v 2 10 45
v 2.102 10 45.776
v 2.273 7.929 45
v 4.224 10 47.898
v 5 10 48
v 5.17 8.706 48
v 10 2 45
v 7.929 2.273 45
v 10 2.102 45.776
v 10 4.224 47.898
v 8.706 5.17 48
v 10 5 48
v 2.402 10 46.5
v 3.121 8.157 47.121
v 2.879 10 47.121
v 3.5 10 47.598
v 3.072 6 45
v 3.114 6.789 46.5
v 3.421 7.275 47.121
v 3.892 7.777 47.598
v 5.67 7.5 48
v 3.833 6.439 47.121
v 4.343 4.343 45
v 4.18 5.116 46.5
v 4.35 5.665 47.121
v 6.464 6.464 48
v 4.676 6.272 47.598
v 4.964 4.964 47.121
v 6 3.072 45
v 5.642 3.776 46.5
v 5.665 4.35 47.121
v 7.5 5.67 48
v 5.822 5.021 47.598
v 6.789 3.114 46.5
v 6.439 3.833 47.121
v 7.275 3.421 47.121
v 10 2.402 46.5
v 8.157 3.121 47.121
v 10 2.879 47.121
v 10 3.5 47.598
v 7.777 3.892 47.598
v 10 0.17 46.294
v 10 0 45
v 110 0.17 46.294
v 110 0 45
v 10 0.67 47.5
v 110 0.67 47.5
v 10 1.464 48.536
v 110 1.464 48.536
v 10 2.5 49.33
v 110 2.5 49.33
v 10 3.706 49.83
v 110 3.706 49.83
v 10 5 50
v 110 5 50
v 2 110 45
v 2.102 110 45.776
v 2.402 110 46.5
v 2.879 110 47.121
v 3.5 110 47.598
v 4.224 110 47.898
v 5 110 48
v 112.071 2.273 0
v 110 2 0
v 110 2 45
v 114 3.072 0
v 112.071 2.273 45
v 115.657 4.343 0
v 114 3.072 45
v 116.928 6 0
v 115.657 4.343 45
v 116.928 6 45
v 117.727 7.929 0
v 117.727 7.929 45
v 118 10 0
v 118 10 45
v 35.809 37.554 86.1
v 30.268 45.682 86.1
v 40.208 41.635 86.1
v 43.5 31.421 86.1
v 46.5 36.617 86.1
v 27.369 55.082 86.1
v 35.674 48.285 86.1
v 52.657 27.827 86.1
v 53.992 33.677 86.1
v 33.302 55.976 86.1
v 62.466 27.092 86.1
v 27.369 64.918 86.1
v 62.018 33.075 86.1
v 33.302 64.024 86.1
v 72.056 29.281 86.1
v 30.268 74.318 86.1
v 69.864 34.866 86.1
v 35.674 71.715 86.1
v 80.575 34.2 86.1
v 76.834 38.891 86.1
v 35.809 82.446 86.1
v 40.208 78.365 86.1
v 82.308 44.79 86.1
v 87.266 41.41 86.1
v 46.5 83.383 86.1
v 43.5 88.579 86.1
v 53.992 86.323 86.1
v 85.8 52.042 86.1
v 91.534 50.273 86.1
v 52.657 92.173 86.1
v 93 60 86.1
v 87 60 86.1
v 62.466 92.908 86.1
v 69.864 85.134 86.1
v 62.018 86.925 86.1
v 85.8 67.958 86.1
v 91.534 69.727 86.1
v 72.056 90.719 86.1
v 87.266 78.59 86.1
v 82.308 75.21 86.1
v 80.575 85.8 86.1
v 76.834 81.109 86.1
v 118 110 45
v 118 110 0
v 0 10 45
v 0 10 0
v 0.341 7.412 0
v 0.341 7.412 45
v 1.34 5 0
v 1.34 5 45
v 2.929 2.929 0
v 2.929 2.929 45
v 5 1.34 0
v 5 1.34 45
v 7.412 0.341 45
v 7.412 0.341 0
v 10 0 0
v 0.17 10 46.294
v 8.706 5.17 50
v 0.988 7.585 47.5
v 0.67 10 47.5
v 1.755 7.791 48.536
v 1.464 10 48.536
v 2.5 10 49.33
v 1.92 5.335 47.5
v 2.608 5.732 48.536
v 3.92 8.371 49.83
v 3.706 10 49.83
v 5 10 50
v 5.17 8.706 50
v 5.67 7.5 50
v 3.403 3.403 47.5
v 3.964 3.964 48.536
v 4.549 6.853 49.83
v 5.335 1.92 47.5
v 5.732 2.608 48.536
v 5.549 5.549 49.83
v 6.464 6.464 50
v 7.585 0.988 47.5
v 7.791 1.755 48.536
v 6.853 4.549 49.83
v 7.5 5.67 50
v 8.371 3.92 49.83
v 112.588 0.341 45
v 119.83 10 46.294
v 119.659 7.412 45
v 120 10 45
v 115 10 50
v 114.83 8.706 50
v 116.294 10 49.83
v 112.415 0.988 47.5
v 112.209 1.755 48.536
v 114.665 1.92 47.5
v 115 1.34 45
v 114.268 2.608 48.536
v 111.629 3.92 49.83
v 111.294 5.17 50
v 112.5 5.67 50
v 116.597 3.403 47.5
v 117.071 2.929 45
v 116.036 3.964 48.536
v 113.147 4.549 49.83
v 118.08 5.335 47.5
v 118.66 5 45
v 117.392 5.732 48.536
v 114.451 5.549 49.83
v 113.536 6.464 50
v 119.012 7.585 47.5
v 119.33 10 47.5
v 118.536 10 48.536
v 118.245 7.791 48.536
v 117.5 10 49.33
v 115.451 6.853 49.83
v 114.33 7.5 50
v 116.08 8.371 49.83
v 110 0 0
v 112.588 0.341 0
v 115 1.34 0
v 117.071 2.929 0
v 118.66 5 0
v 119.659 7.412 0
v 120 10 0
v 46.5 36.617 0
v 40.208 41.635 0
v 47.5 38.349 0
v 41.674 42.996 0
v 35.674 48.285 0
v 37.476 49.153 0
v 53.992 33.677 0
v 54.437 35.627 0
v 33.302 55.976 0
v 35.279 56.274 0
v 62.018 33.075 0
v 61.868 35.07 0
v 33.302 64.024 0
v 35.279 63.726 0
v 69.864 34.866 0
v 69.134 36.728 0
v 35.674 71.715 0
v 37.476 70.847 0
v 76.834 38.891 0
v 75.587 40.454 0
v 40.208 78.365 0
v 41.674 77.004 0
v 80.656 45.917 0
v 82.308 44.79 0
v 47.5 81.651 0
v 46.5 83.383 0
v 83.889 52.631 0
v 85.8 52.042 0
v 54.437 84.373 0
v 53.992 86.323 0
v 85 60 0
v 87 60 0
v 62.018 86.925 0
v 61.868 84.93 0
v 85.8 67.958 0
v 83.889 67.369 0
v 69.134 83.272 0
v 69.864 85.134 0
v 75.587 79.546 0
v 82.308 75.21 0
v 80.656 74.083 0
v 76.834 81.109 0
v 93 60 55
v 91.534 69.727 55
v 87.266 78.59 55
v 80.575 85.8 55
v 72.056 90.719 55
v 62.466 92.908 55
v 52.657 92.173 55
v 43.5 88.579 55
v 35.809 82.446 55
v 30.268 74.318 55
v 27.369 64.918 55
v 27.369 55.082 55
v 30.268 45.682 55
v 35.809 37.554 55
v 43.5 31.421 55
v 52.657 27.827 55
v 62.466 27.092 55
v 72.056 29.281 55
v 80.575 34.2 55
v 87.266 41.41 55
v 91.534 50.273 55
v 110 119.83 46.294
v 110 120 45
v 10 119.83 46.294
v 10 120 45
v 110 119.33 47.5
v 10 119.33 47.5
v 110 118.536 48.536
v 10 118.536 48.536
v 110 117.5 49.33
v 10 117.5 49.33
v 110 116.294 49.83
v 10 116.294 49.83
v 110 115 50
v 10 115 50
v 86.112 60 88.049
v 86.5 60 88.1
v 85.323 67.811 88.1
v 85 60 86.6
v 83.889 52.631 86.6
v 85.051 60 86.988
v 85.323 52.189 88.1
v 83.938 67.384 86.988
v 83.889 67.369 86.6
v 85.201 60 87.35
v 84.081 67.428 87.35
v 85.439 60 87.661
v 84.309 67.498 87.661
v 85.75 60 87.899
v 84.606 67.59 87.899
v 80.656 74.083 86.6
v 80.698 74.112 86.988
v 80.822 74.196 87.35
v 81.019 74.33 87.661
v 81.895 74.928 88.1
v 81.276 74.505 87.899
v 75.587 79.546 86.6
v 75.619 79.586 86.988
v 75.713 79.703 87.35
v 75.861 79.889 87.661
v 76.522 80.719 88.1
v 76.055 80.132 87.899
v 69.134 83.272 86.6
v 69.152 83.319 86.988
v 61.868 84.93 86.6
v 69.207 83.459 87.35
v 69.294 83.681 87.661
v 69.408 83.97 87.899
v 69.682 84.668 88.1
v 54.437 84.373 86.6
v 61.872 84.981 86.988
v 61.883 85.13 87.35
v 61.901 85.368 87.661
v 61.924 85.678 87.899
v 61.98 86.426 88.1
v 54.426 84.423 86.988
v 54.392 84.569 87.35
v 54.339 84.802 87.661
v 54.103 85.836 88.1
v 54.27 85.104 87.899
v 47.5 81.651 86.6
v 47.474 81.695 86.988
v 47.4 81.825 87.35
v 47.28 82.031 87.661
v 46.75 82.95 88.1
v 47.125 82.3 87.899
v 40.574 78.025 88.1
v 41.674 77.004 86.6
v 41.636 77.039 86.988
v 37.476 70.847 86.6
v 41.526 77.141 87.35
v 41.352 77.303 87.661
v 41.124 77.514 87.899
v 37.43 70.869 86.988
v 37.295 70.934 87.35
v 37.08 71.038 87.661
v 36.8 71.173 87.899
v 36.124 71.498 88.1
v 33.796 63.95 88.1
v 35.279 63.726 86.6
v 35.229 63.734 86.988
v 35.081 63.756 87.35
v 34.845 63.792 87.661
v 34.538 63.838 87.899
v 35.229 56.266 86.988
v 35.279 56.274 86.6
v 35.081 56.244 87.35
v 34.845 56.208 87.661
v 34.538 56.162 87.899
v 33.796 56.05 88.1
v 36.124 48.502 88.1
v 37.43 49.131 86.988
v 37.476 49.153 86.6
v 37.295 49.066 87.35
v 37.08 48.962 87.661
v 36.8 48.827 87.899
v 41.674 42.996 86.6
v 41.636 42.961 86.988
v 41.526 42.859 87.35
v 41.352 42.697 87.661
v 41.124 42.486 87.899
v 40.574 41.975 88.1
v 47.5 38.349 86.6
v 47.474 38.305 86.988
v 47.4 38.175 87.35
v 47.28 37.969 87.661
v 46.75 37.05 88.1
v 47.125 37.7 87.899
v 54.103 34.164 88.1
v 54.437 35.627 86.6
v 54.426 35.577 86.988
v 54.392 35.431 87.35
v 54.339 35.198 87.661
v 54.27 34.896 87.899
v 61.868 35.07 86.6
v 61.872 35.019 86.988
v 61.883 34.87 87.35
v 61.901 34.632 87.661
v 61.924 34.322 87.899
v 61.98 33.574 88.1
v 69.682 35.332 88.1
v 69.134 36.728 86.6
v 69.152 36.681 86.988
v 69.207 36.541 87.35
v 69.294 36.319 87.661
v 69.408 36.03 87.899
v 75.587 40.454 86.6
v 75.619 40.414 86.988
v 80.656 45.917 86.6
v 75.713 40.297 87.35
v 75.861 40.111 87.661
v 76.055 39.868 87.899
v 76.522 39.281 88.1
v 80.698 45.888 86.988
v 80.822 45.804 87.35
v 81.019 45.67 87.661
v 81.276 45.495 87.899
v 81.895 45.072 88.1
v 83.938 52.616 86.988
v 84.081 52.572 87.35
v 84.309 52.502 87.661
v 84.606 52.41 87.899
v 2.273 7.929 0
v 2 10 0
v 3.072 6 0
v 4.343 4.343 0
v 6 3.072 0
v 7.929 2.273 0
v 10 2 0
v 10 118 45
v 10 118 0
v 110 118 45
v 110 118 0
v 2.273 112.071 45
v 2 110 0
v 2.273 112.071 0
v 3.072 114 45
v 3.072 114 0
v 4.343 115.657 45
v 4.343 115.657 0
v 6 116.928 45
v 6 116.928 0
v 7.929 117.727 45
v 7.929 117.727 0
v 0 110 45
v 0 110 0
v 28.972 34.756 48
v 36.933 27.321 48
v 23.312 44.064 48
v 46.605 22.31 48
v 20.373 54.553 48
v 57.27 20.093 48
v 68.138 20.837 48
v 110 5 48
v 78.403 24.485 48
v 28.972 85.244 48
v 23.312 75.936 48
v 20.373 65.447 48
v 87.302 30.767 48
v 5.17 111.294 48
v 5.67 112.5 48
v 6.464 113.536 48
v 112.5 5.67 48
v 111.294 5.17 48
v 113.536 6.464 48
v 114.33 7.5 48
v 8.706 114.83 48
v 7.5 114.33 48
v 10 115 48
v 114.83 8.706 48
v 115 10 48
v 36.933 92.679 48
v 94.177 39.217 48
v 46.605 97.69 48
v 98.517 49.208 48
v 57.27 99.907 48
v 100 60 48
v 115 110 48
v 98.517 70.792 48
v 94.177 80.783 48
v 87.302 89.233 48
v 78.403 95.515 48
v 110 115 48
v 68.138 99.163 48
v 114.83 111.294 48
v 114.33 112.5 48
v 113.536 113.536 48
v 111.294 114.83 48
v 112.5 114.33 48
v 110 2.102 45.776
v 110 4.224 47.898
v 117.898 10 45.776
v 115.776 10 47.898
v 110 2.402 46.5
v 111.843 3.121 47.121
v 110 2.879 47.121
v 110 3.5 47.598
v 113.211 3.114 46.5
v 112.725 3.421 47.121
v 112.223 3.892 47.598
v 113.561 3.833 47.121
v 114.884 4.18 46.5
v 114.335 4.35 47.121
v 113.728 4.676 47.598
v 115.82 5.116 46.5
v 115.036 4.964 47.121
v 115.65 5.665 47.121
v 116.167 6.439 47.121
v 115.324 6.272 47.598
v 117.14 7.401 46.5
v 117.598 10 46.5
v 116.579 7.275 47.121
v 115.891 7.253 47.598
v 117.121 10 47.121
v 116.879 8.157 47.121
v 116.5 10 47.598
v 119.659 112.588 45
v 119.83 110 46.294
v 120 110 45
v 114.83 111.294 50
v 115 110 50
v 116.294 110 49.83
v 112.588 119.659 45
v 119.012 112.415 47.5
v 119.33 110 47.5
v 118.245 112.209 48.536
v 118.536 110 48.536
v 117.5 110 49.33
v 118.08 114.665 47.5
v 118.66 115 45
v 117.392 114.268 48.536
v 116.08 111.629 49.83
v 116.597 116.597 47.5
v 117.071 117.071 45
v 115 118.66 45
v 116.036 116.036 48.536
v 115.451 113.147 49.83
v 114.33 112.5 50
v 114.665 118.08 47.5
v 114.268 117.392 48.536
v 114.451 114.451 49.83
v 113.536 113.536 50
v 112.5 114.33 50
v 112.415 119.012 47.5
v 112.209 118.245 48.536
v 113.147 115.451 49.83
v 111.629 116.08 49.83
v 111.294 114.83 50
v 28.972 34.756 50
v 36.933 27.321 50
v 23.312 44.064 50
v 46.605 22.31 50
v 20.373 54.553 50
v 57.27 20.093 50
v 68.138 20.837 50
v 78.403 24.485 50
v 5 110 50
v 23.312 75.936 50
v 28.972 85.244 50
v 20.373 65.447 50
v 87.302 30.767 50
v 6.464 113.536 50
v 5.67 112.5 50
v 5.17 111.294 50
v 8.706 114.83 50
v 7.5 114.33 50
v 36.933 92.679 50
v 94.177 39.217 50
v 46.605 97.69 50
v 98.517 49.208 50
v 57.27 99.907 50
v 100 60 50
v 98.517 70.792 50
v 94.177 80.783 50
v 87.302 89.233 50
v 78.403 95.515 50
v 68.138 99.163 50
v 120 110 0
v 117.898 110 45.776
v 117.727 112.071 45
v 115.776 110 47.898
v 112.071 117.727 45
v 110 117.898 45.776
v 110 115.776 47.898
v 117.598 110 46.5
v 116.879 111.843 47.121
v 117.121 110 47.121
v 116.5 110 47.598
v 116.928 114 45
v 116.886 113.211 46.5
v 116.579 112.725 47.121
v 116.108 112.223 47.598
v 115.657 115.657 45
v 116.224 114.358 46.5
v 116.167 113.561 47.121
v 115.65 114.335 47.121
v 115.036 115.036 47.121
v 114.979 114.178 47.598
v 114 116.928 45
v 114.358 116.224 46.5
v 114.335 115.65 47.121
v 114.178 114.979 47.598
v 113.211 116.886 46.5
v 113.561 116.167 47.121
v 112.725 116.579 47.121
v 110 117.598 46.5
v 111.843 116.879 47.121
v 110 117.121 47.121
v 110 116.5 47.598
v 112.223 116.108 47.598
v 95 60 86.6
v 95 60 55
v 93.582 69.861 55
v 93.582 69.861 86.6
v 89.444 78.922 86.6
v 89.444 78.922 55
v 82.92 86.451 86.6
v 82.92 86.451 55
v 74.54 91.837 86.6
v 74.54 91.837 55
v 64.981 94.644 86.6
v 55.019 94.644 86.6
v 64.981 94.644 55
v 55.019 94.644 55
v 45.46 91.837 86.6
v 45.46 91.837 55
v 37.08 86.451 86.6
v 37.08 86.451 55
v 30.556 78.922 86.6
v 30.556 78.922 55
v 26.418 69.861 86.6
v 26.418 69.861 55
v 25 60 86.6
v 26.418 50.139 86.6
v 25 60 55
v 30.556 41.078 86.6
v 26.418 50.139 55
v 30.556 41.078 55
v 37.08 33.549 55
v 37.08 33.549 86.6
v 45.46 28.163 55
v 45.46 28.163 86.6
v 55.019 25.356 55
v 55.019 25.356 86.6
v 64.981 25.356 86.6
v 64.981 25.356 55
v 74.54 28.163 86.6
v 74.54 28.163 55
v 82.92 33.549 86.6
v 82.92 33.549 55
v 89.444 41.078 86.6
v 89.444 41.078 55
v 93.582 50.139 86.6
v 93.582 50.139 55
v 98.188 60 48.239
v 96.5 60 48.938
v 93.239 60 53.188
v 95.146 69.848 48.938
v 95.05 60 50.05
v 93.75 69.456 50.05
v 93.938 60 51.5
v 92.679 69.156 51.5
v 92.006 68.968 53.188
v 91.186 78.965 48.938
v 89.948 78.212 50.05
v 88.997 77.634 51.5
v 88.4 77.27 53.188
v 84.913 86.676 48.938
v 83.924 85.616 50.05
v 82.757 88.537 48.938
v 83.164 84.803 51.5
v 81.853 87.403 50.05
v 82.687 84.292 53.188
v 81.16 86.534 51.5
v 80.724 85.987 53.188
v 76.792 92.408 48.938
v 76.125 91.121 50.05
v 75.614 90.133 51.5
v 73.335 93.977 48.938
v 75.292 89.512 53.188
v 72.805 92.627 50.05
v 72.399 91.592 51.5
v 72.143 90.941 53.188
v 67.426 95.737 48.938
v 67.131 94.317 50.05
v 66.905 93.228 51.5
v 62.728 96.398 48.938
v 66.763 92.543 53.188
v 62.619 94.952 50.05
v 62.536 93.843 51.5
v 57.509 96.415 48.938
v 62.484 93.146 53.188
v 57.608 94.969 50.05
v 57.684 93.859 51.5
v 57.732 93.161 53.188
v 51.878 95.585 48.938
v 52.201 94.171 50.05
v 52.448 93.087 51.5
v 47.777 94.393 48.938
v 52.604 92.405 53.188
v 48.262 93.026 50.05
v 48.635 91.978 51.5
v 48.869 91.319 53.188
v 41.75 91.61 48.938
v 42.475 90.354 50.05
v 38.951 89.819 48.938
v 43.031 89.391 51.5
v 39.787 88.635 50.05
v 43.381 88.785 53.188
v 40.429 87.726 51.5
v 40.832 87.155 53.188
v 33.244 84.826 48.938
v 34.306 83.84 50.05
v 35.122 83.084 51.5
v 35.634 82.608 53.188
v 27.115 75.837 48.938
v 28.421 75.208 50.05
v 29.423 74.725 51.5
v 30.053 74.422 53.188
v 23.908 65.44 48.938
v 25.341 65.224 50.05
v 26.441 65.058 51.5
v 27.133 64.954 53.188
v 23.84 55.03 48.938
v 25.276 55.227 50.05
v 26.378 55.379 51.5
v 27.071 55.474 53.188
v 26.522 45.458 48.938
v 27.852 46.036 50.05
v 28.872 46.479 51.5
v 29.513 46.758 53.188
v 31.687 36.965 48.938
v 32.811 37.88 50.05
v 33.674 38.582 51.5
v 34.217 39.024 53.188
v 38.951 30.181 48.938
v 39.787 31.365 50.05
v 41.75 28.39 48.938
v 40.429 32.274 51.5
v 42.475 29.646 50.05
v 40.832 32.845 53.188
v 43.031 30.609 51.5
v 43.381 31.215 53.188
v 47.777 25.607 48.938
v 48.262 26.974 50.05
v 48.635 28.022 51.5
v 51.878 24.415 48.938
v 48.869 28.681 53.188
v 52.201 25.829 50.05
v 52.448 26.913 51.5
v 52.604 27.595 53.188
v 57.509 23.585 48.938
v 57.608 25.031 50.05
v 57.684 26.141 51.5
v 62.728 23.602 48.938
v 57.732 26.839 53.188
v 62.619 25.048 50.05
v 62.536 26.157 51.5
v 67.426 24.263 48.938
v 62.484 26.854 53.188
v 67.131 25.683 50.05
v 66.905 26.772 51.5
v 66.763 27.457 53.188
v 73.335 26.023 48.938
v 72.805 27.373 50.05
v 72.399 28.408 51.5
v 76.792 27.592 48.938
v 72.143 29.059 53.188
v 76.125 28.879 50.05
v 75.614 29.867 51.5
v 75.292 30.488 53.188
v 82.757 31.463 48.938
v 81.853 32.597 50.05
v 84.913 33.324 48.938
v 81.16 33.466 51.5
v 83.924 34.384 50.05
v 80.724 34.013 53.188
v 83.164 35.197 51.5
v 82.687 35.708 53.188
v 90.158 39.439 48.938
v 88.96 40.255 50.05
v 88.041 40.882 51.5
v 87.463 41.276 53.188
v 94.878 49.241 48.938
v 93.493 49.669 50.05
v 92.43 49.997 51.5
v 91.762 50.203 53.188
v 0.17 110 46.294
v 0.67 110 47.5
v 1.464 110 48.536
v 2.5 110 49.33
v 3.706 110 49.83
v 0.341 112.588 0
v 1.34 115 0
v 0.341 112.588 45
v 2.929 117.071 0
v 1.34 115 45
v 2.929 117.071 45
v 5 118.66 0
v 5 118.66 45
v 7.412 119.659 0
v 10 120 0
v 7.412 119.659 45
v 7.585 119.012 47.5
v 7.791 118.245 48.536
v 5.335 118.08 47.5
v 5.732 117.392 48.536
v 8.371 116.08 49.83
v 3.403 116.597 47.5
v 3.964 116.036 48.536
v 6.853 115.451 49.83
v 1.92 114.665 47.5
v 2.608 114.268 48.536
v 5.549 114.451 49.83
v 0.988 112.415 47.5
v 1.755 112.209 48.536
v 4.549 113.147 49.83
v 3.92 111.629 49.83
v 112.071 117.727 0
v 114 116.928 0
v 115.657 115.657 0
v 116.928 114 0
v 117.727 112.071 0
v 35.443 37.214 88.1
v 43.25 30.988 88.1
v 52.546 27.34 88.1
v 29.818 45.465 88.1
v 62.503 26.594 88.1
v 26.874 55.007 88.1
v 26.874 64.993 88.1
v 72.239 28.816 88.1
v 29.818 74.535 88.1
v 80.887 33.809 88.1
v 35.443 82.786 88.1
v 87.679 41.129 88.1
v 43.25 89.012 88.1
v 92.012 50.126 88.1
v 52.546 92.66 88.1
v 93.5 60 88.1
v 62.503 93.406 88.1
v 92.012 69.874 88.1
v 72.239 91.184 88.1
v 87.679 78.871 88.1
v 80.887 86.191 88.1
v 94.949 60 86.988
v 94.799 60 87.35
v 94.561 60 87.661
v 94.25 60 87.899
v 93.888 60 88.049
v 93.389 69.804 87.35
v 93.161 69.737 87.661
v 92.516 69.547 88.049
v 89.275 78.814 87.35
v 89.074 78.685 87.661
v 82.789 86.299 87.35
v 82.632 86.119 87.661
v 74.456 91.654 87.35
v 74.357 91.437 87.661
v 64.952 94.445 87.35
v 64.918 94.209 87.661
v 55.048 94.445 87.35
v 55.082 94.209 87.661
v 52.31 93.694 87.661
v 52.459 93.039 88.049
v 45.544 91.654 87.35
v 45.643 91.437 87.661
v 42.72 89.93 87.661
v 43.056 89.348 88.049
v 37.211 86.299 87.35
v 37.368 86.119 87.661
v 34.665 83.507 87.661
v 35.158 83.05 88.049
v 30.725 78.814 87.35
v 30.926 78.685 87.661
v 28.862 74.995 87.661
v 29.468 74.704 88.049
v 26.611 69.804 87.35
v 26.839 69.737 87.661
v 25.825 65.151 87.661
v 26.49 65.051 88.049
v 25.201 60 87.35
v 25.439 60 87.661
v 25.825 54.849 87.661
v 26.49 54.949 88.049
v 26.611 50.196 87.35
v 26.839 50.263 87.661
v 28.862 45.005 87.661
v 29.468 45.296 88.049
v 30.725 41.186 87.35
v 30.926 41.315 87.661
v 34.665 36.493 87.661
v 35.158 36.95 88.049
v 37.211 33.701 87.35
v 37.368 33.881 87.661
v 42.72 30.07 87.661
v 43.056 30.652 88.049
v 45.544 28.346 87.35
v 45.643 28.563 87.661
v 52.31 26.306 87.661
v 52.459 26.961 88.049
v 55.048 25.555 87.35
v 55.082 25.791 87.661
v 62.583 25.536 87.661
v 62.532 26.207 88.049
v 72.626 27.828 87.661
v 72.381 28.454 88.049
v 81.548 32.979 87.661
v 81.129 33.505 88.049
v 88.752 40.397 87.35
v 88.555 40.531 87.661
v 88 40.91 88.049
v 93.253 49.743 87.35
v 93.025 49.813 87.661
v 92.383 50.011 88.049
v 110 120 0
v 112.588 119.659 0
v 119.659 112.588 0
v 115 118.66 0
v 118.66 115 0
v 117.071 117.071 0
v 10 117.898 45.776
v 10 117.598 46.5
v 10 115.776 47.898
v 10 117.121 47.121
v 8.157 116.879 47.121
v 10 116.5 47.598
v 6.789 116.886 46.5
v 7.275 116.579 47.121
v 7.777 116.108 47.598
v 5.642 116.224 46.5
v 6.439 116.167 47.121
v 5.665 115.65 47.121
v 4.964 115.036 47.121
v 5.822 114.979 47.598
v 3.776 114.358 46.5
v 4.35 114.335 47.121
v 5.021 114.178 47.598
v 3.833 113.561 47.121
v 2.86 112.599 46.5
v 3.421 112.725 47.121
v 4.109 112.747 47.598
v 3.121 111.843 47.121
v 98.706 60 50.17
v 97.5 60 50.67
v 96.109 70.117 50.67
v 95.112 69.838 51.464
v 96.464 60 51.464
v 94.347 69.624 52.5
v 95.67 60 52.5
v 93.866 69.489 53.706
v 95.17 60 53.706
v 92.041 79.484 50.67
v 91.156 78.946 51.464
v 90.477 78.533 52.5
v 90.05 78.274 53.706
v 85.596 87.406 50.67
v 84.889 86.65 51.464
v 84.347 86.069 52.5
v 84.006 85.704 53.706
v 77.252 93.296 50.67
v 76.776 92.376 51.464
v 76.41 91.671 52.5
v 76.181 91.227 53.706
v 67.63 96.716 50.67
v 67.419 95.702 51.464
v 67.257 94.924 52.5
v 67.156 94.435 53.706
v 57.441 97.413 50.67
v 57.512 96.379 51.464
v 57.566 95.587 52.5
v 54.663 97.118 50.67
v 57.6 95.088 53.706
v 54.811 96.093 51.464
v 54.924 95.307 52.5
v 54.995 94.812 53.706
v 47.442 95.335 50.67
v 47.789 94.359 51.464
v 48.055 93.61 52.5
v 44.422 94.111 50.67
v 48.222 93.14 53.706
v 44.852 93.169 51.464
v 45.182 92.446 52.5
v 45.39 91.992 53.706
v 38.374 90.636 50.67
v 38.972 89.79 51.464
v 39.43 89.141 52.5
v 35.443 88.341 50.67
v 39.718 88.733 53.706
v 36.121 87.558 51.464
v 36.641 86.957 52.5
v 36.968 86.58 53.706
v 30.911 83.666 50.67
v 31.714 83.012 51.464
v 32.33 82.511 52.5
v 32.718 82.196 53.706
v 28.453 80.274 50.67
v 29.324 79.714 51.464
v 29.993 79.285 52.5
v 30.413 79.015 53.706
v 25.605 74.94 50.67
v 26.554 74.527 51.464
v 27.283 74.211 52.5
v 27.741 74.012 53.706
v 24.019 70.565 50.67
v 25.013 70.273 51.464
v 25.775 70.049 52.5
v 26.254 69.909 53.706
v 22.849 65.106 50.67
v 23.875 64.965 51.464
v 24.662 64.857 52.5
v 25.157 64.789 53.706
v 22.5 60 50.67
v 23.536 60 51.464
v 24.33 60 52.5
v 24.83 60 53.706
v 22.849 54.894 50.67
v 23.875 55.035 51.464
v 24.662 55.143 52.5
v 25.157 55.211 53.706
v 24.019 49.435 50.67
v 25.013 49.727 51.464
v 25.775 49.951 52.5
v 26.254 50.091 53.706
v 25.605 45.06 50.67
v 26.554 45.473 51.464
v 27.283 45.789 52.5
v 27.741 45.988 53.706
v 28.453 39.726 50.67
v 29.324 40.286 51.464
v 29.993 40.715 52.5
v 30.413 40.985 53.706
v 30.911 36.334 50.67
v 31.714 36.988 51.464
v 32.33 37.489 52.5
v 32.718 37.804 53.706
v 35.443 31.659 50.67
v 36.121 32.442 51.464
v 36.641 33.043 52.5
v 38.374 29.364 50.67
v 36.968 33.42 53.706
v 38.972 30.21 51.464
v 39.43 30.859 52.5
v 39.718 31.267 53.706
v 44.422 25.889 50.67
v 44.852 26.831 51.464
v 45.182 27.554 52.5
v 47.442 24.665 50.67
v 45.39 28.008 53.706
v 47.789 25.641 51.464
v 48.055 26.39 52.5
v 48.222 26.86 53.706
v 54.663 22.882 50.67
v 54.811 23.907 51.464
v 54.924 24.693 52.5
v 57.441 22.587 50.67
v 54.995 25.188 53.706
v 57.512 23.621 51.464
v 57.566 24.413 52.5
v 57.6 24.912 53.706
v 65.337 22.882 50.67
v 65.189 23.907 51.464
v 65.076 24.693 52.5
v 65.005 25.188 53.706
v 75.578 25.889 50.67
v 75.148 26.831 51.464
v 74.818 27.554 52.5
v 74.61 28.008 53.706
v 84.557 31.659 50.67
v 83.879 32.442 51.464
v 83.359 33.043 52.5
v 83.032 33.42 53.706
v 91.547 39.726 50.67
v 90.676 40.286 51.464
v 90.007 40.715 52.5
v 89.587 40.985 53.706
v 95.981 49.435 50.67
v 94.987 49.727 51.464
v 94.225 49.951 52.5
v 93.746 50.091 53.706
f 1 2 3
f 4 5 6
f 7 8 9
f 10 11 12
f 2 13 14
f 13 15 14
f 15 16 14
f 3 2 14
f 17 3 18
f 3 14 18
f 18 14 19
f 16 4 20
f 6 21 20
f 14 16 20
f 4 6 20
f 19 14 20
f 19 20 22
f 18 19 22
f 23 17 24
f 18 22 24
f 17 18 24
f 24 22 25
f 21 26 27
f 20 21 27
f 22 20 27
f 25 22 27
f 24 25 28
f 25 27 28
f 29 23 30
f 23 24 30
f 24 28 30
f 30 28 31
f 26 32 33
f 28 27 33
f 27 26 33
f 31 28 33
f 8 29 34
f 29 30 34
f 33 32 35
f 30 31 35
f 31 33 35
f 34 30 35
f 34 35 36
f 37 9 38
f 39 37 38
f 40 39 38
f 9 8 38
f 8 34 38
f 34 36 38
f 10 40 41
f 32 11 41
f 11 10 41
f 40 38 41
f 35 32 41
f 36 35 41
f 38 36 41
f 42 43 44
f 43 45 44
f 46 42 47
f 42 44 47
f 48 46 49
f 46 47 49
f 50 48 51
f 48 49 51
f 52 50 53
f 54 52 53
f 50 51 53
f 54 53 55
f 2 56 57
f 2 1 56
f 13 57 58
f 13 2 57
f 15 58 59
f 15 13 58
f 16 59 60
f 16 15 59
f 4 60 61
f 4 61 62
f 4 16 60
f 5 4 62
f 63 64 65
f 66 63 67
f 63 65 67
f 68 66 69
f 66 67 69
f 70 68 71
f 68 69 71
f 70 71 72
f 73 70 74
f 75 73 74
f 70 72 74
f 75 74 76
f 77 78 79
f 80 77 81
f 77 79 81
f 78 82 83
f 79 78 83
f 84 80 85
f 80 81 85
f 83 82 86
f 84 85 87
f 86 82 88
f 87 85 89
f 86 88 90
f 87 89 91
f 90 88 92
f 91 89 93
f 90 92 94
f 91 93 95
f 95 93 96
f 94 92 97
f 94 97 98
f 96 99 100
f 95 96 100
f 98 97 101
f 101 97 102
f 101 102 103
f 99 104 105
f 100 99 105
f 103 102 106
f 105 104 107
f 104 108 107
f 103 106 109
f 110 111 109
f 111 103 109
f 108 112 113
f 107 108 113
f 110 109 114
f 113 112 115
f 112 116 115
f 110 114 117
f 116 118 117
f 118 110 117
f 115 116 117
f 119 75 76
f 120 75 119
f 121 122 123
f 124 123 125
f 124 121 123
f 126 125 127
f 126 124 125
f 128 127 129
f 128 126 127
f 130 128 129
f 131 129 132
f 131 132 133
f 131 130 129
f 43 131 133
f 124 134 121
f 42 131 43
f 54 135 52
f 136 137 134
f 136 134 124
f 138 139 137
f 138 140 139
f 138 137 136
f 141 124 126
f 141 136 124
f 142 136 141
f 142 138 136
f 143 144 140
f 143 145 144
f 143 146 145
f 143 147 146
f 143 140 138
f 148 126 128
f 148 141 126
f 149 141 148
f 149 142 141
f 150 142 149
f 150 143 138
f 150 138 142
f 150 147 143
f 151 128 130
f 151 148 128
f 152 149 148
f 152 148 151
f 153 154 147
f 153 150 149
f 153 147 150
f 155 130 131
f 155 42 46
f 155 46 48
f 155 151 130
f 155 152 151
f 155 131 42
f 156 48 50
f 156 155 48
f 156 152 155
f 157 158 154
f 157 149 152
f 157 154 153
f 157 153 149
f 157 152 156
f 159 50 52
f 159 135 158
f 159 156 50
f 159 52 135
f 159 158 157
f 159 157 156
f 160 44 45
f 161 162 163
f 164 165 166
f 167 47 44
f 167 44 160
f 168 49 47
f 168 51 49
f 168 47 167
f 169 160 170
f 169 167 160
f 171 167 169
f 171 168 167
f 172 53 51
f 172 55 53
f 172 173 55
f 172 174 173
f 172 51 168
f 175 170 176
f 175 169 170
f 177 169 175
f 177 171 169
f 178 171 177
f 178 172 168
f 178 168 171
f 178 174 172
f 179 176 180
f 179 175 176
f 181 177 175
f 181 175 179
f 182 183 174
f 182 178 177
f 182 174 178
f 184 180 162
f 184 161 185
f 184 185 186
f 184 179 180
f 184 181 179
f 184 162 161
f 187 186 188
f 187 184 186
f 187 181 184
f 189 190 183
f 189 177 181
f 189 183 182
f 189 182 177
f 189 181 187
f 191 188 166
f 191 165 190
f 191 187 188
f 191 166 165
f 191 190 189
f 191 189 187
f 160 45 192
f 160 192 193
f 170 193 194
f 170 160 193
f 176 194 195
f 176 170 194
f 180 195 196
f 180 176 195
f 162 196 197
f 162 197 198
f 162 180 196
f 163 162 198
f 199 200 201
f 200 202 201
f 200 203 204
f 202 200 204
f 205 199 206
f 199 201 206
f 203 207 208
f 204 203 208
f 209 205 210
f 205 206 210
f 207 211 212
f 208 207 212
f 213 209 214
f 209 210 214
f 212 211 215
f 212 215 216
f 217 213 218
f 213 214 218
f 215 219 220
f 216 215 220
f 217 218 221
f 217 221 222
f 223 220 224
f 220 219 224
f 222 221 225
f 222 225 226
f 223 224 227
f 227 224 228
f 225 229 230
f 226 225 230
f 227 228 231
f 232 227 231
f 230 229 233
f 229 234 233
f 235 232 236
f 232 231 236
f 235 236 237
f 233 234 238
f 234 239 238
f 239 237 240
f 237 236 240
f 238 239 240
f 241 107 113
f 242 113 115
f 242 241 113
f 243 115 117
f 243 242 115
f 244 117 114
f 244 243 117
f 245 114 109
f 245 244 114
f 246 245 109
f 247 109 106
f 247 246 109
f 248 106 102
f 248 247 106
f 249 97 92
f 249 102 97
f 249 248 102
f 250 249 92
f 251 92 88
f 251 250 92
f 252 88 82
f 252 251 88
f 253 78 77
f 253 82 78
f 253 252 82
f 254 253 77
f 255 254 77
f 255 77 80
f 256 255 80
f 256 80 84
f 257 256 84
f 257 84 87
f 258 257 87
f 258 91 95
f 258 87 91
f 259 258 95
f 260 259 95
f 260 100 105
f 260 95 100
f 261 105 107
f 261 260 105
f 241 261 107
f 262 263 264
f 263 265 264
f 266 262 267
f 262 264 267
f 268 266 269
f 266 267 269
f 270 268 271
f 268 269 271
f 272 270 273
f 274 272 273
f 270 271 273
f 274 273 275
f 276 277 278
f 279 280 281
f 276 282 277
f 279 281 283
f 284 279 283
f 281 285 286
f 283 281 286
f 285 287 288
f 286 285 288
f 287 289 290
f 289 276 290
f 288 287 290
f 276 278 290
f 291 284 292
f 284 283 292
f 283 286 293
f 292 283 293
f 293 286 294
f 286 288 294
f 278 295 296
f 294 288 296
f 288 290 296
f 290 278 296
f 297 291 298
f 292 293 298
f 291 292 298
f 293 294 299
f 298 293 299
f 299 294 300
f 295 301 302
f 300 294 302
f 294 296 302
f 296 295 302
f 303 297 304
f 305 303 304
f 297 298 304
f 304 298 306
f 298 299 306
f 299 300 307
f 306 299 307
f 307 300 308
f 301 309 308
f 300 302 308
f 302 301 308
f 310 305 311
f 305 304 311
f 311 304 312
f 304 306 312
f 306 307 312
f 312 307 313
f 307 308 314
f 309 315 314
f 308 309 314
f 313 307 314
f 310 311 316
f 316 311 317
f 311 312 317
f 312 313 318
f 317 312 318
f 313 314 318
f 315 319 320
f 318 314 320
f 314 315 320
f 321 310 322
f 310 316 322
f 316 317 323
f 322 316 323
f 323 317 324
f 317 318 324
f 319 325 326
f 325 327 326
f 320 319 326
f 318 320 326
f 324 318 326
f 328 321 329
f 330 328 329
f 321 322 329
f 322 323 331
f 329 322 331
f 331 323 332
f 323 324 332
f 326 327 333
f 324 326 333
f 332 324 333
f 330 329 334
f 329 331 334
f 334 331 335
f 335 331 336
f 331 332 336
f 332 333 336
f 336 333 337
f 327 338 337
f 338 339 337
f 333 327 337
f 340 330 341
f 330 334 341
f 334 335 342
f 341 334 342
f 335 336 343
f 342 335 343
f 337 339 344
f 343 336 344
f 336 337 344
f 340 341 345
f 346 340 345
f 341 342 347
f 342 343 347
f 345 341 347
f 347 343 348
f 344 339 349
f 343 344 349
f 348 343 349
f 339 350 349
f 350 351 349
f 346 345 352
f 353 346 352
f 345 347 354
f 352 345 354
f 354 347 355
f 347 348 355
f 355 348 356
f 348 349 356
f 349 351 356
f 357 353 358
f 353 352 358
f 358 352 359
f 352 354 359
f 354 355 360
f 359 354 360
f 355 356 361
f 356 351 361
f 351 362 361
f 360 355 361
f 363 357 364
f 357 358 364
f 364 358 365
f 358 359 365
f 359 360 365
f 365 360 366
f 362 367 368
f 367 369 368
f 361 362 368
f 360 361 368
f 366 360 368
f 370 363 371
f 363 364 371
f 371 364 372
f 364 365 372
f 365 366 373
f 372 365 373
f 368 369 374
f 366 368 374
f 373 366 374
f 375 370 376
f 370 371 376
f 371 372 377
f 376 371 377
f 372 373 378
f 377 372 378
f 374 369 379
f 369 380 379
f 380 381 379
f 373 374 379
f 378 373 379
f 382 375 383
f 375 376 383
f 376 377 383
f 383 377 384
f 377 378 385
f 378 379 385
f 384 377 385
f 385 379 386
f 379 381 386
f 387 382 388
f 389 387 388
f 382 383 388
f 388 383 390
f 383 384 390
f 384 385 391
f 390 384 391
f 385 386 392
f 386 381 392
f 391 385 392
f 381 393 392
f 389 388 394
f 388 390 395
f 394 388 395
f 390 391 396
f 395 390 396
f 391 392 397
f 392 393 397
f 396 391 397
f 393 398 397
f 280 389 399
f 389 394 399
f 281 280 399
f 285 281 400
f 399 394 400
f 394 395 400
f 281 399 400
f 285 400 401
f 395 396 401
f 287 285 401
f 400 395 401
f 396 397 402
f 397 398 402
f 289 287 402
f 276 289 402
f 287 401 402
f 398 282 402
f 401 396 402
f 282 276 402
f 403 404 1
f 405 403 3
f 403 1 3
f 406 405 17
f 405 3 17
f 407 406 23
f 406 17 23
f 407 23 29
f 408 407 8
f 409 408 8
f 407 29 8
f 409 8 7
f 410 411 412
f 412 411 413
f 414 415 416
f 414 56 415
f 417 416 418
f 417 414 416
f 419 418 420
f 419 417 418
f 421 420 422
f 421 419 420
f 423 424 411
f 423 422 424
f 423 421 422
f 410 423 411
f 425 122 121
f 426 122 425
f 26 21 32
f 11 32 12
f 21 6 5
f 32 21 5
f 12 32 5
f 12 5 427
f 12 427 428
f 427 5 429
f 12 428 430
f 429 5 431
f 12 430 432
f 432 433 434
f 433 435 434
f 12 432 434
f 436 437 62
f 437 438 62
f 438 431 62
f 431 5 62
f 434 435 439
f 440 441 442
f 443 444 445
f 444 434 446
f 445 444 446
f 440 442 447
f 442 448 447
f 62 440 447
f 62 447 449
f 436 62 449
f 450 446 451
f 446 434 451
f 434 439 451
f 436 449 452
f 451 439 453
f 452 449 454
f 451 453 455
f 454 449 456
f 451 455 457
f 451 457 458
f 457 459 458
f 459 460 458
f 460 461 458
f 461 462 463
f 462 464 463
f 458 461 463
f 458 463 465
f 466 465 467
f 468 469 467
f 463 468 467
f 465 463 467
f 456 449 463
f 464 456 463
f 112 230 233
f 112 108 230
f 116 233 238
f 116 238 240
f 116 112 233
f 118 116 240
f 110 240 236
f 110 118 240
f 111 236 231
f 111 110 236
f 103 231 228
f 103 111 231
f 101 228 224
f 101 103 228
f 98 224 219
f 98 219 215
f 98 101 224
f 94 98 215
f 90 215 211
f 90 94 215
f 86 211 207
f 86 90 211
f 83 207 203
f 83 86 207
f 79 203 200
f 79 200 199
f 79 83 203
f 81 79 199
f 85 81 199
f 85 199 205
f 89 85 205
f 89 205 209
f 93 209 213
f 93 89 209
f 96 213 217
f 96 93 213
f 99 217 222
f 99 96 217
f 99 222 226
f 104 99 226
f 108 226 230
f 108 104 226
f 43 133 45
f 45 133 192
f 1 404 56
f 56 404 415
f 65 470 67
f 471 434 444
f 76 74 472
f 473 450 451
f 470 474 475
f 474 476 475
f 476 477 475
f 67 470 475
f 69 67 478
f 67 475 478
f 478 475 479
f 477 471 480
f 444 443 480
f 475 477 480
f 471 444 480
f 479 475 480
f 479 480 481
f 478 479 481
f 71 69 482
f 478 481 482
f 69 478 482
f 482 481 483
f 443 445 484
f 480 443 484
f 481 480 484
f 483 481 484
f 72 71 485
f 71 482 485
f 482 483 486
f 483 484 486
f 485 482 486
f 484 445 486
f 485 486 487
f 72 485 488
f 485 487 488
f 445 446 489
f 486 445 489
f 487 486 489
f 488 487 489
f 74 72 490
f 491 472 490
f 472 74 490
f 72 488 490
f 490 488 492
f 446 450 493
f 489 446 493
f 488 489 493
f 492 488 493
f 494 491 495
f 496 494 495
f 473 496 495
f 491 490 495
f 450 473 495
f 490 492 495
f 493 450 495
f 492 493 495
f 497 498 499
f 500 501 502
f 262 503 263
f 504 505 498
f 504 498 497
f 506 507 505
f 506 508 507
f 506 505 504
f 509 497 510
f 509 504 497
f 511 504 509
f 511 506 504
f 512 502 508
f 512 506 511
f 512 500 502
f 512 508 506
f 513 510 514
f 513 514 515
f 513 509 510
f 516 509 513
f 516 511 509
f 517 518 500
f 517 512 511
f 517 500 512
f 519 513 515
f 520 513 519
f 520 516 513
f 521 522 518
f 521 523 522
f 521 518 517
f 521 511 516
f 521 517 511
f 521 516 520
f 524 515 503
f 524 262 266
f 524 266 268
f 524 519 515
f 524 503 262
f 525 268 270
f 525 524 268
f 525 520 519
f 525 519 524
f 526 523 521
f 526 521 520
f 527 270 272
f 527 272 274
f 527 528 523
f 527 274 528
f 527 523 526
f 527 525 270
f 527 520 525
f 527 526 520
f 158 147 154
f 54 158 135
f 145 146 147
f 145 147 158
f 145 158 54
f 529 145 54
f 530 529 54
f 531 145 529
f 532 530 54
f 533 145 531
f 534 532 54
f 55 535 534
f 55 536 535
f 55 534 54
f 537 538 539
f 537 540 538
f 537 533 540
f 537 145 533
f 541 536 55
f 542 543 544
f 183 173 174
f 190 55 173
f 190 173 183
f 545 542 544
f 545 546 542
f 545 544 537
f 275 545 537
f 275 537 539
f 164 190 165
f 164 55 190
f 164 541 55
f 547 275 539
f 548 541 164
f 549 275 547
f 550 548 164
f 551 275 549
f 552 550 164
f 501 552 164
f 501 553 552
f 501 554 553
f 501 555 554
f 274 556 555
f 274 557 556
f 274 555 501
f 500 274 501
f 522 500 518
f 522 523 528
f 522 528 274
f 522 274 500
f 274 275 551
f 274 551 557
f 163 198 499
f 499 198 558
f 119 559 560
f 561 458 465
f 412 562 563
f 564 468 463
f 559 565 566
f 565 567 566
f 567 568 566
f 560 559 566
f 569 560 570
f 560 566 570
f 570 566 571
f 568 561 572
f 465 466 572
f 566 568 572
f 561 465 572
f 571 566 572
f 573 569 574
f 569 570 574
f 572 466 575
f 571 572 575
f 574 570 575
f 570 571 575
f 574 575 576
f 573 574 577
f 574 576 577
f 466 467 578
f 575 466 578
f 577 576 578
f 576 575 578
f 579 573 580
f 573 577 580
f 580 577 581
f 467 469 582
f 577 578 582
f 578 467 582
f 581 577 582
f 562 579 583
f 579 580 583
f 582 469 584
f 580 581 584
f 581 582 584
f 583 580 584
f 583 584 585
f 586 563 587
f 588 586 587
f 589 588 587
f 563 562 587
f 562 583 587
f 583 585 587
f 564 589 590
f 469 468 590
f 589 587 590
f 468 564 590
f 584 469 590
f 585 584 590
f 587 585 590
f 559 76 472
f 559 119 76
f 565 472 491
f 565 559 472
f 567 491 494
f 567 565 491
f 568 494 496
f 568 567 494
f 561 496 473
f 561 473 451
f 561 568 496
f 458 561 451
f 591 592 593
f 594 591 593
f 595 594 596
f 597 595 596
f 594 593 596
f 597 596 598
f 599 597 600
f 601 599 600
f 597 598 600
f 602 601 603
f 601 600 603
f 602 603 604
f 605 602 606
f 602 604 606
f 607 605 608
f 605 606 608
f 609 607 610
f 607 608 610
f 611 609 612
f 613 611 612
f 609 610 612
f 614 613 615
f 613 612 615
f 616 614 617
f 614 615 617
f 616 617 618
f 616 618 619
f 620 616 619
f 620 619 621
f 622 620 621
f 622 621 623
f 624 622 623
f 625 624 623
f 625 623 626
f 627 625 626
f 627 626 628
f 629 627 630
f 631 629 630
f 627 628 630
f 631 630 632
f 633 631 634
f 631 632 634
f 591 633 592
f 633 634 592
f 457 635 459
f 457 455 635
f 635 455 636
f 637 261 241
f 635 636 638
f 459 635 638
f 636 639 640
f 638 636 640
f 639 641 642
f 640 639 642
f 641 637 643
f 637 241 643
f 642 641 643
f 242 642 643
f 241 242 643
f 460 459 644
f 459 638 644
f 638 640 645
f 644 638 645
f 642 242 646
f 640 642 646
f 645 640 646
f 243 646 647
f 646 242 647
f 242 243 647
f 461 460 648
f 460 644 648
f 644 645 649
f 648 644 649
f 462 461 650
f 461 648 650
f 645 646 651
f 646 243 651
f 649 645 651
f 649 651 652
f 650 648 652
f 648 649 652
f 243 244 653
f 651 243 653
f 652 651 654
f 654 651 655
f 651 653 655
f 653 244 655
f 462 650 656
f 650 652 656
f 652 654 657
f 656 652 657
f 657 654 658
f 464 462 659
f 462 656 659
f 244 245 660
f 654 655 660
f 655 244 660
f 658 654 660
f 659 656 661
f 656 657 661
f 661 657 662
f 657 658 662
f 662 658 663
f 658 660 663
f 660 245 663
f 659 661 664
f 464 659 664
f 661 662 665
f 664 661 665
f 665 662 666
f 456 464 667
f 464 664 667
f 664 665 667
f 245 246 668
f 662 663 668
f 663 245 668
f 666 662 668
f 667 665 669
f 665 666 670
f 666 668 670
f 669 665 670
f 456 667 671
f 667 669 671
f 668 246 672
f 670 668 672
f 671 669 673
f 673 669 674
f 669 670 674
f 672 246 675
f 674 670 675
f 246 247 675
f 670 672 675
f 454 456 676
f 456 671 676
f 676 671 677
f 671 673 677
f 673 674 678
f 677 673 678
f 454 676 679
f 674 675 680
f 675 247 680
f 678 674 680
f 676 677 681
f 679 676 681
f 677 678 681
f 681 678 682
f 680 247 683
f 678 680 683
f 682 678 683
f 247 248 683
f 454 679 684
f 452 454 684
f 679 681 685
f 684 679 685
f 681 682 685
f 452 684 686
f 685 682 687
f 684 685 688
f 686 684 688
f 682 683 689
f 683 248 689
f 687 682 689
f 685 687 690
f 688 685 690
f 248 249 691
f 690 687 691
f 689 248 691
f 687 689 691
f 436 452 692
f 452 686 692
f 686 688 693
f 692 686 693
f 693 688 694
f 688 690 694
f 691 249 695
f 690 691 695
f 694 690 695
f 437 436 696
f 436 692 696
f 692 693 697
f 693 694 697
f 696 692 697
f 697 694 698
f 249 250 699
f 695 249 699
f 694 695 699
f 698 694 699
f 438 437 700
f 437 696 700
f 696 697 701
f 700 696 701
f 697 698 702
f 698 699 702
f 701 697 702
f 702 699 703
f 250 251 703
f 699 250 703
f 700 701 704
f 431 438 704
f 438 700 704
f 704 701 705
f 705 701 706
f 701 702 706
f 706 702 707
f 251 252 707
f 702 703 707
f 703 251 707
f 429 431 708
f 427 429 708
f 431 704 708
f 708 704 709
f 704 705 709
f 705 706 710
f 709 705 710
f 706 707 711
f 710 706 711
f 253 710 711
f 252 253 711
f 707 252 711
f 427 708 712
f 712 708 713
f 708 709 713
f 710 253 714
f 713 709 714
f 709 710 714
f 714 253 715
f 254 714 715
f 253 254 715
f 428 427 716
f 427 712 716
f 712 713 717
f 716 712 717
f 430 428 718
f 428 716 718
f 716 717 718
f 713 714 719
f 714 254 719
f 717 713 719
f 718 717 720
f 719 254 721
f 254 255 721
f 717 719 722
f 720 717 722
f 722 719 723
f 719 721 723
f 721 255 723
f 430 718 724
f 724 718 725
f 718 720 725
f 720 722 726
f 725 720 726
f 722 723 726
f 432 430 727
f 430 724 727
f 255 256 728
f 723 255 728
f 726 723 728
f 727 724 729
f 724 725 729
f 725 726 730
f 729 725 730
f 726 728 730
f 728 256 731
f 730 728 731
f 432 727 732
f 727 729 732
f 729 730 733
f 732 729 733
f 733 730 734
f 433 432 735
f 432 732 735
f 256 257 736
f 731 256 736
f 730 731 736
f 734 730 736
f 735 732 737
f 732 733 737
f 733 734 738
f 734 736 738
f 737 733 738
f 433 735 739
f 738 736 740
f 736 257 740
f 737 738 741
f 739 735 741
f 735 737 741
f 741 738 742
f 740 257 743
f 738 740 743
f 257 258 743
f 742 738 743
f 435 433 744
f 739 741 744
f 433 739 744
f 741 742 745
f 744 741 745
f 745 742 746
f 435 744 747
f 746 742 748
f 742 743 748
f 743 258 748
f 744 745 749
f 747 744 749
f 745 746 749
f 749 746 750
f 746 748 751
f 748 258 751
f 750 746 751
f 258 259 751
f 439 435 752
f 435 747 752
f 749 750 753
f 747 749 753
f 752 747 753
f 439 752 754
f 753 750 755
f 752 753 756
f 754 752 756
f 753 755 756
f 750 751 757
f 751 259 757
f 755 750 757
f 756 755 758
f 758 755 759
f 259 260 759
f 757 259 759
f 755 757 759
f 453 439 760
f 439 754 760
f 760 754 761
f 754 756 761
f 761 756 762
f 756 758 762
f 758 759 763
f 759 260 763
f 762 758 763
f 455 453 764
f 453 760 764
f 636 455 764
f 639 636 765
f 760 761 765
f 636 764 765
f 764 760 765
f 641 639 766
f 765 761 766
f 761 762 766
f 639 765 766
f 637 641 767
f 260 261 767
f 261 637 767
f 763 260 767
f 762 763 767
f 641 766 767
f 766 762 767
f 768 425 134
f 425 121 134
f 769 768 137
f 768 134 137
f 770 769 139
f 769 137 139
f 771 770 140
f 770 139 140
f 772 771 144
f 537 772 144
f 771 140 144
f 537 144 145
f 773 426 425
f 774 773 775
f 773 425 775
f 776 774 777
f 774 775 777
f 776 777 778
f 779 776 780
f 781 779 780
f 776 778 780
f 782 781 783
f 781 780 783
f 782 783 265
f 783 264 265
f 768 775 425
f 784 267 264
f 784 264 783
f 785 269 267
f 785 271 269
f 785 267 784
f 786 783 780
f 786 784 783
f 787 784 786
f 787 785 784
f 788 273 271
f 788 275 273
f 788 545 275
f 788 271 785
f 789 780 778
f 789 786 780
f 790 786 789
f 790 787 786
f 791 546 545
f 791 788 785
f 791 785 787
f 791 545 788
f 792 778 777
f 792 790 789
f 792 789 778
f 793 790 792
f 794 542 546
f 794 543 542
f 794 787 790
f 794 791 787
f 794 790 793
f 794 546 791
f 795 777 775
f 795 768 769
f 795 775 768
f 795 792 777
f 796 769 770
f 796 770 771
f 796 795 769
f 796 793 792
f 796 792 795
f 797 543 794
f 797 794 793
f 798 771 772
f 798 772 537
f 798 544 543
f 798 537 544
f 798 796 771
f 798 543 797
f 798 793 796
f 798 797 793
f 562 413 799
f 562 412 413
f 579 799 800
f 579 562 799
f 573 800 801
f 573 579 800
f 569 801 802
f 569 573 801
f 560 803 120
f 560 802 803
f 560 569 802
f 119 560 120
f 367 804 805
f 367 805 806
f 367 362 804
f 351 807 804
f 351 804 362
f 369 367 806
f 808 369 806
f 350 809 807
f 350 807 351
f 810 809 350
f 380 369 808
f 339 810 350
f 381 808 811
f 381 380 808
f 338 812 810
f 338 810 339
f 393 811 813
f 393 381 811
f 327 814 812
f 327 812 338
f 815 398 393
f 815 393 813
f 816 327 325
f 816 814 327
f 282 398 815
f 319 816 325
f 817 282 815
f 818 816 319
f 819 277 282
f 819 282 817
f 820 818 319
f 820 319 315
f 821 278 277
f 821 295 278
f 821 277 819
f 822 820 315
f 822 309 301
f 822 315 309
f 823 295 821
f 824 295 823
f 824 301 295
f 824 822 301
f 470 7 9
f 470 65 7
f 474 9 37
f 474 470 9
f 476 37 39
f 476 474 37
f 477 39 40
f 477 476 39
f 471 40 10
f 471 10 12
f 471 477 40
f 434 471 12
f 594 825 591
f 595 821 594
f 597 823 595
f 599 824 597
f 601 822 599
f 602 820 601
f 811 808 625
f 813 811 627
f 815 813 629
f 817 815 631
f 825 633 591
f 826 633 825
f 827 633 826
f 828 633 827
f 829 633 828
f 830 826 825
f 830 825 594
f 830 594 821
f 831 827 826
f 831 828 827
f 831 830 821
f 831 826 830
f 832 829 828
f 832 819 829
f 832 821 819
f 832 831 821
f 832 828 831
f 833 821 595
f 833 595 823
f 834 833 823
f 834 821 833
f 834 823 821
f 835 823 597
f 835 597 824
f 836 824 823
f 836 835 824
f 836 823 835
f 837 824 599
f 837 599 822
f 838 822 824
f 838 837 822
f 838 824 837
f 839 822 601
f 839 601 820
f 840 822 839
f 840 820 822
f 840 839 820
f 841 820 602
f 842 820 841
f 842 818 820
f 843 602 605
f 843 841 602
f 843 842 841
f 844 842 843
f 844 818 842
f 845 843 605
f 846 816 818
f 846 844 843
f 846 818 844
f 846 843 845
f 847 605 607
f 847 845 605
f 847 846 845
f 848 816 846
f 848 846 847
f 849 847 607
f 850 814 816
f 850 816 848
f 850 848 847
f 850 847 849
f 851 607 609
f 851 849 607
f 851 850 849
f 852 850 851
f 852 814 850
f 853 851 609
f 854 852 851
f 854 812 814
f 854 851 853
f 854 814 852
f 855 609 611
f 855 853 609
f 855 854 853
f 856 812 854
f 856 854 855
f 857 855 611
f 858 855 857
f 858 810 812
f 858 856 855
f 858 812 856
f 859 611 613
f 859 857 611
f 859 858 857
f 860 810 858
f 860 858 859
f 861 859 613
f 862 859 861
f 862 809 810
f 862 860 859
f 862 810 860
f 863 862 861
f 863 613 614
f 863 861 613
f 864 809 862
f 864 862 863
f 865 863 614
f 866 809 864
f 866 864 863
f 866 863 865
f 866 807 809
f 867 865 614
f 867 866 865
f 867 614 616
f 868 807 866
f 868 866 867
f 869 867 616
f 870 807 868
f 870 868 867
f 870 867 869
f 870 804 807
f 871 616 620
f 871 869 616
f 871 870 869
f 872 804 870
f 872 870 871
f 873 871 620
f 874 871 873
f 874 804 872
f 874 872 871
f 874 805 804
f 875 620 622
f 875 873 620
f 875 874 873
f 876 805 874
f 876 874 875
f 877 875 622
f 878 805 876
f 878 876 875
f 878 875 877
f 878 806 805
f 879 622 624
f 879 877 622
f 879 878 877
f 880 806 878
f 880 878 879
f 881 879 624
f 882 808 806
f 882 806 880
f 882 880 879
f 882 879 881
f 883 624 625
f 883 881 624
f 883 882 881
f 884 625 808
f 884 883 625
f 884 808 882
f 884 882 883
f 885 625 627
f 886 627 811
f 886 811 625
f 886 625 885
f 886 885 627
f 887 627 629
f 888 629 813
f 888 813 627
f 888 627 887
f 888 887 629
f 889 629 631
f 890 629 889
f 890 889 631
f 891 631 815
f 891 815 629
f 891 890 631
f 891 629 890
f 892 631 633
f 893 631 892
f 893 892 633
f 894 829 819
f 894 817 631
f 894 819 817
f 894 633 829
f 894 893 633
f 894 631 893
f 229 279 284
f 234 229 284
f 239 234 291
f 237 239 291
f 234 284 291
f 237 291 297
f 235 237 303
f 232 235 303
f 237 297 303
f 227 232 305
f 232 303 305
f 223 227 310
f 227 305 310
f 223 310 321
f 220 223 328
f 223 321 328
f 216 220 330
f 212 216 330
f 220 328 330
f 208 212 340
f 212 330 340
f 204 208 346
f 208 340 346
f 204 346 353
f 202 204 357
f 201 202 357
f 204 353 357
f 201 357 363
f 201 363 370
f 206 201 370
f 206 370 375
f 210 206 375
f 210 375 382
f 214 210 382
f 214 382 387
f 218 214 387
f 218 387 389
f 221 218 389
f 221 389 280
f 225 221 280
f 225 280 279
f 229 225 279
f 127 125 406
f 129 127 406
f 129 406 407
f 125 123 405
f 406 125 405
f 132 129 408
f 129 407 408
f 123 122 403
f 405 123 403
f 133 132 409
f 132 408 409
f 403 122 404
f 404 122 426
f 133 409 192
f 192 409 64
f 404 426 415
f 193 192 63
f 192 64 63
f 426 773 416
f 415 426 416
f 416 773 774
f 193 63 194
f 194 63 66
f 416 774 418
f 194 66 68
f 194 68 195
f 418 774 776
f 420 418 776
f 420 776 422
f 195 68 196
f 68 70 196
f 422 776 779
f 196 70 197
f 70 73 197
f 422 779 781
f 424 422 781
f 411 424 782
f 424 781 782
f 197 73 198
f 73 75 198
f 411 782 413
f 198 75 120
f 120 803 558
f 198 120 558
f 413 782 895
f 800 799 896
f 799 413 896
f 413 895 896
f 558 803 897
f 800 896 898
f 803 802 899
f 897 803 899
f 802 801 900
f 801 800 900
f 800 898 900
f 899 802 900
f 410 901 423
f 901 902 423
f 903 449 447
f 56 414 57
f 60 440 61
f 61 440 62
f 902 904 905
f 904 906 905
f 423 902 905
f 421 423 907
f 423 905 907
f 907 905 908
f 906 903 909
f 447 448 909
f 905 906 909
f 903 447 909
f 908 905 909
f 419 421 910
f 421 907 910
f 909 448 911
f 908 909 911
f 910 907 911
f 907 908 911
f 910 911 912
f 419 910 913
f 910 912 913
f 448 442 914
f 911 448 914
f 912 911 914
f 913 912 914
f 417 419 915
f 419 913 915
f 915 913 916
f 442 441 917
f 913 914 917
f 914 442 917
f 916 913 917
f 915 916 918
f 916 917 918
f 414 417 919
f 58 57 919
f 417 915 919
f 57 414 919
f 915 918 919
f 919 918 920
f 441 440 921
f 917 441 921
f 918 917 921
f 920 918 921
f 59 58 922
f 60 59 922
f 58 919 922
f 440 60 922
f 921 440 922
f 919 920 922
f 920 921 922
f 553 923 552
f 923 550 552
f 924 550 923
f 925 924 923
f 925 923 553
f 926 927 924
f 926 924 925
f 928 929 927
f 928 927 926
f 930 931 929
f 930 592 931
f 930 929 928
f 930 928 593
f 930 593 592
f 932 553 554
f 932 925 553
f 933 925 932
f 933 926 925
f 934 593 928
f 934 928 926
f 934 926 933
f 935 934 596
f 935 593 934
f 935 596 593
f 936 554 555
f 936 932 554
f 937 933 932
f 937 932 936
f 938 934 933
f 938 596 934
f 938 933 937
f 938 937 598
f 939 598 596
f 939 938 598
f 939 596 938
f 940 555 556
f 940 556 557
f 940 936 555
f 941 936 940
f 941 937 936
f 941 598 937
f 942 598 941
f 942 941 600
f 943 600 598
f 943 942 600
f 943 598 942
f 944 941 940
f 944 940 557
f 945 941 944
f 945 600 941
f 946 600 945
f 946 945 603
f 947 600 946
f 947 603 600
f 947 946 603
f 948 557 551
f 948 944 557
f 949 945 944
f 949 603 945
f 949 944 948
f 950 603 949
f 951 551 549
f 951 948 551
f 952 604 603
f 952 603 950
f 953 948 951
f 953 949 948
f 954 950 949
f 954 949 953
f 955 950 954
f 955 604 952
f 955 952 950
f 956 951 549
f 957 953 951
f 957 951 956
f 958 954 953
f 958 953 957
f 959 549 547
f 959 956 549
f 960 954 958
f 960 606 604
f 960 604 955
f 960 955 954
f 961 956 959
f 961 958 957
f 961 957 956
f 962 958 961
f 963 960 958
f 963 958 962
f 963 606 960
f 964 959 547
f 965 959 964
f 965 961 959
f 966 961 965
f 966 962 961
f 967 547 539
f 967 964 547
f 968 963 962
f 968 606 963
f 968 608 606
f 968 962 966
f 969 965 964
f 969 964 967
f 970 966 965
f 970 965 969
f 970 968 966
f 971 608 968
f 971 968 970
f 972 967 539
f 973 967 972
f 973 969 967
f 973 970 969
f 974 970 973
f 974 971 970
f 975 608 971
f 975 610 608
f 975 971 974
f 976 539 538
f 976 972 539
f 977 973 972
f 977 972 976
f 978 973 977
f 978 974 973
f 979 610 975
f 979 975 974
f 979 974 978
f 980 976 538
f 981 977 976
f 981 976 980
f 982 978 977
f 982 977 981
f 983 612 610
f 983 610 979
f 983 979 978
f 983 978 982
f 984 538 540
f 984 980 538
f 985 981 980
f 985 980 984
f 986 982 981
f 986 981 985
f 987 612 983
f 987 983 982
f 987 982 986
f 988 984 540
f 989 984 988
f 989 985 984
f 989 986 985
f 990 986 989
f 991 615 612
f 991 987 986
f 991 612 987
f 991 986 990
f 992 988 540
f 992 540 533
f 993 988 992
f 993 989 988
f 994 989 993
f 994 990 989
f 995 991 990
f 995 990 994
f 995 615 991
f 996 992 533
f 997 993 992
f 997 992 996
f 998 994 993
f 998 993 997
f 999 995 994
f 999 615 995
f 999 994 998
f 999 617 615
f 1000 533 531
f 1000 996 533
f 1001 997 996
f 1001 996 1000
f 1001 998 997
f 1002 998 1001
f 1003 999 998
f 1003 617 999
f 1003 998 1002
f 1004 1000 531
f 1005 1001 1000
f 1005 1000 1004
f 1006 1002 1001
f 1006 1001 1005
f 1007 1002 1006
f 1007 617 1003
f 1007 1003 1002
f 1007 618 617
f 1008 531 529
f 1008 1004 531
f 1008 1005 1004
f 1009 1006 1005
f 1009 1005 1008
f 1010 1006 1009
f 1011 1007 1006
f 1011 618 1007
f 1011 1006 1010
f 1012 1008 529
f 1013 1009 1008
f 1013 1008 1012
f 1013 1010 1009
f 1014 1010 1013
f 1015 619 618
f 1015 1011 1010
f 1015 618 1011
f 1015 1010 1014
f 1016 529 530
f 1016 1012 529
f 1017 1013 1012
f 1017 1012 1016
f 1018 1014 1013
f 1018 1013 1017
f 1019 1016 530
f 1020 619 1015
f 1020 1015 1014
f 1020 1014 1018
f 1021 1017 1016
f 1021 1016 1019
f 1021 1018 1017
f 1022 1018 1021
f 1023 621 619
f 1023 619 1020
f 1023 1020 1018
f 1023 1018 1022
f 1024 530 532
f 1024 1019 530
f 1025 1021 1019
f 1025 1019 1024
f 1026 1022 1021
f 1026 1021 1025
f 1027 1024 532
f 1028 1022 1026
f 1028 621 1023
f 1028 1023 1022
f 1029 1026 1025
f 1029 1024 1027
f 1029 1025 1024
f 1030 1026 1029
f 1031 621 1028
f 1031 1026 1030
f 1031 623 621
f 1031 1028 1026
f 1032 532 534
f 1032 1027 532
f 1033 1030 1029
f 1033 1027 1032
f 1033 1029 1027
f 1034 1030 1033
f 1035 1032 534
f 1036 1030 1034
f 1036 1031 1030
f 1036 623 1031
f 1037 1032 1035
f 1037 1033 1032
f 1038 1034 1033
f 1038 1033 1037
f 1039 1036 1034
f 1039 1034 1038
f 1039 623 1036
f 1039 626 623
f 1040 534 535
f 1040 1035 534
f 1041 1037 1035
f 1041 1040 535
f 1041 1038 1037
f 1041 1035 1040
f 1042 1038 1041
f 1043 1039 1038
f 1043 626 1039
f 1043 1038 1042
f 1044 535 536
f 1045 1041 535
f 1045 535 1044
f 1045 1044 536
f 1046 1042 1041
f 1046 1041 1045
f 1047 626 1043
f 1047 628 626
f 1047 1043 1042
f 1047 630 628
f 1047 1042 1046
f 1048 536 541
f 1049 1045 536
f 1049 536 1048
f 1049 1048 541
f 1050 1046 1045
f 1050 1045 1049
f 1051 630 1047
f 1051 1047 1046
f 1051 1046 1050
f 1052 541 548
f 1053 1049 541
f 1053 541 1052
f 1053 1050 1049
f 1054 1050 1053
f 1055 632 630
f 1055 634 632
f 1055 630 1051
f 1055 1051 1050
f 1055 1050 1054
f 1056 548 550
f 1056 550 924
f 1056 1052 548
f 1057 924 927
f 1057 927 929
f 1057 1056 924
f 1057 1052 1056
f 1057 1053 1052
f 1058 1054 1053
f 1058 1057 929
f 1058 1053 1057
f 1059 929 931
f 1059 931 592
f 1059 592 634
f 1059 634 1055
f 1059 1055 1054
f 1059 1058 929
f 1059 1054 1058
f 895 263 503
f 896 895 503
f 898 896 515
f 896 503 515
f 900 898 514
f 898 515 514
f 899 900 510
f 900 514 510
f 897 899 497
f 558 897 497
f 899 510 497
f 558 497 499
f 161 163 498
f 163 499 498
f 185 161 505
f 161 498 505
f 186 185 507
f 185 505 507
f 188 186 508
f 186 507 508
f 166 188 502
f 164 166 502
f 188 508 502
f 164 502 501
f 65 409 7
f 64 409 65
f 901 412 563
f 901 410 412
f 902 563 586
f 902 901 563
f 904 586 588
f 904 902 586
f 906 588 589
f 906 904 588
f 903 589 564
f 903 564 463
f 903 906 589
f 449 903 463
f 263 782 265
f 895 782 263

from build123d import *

# Parameters (mm, degrees)
SKETCH1_W           = 120
SKETCH1_H           = 120
BOSS_EXTRUDE1_DEPTH = 50
SKETCH2_R           = 35
BOSS_EXTRUDE2_DEPTH = 38.1
SKETCH6_R           = 25
BOSS_EXTRUDE6_DEPTH = 88.1
SKETCH7_R           = 25
BOSS_EXTRUDE7_DEPTH = 88.1
SKETCH8_R           = 25
CUT_EXTRUDE1_DEPTH  = 89.1
FILLET1_R           = 10
FILLET2_R           = 1.5
FILLET3_R           = 5
SHELL2_T            = -2


with BuildPart() as part:
    # Sketch1 → Boss-Extrude1 (new body)
    with BuildSketch(Plane.XY):
        with Locations((60, 60)):
            Rectangle(SKETCH1_W, SKETCH1_H)
    extrude(amount=BOSS_EXTRUDE1_DEPTH)

    # Sketch2 → Boss-Extrude2 (add)
    with BuildSketch(Plane.XY.offset(50)):
        with Locations((60, 60)):
            Circle(SKETCH2_R)
    extrude(amount=BOSS_EXTRUDE2_DEPTH)

    # Sketch6 → Boss-Extrude6 (add, through all)
    with BuildSketch(Plane.XY.offset(88.1)):
        with Locations((60, 60)):
            Circle(SKETCH6_R)
    extrude(amount=-BOSS_EXTRUDE6_DEPTH)

    # Sketch7 → Boss-Extrude7 (add, through all)
    with BuildSketch(Plane.XY.offset(88.1)):
        with Locations((60, 60)):
            Circle(SKETCH7_R)
    extrude(amount=-BOSS_EXTRUDE7_DEPTH)

    # Sketch8 → Cut-Extrude1 (cut, through all)
    with BuildSketch(Plane.XY.offset(88.1)):
        with Locations((60, 60)):
            Circle(SKETCH8_R)
    extrude(amount=-CUT_EXTRUDE1_DEPTH, mode=Mode.SUBTRACT)

    # Fillet1
    fillet1_edges = [part.edges().sort_by_distance(p)[0] for p in [
        (0, 120, 25),
        (120, 120, 25),
        (120, 0, 25),
        (0, 0, 25),
    ]]
    fillet(fillet1_edges, radius=FILLET1_R)

    # Fillet2
    fillet2_edges = [part.edges().sort_by_distance(p)[0] for p in [
        (25, 60, 88.1),
        (35, 60, 88.1),
    ]]
    fillet(fillet2_edges, radius=FILLET2_R)

    # Fillet3
    fillet3_edges = [part.edges().sort_by_distance(p)[0] for p in [
        (25, 60, 50),
        (60, 0, 50),
        (0, 60, 50),
        (120, 60, 50),
        (60, 120, 50),
        (117.071067812, 117.071067812, 50),
        (117.071067812, 2.928932188, 50),
        (2.928932188, 117.071067812, 50),
        (2.928932188, 2.928932188, 50),
    ]]
    fillet(fillet3_edges, radius=FILLET3_R)

    # Shell2
    shell2_openings = [part.faces().sort_by_distance(p)[0] for p in [
        (85, 60, 0),
    ]]
    offset(amount=SHELL2_T, openings=shell2_openings, kind=Kind.INTERSECTION)


solid = part.part
